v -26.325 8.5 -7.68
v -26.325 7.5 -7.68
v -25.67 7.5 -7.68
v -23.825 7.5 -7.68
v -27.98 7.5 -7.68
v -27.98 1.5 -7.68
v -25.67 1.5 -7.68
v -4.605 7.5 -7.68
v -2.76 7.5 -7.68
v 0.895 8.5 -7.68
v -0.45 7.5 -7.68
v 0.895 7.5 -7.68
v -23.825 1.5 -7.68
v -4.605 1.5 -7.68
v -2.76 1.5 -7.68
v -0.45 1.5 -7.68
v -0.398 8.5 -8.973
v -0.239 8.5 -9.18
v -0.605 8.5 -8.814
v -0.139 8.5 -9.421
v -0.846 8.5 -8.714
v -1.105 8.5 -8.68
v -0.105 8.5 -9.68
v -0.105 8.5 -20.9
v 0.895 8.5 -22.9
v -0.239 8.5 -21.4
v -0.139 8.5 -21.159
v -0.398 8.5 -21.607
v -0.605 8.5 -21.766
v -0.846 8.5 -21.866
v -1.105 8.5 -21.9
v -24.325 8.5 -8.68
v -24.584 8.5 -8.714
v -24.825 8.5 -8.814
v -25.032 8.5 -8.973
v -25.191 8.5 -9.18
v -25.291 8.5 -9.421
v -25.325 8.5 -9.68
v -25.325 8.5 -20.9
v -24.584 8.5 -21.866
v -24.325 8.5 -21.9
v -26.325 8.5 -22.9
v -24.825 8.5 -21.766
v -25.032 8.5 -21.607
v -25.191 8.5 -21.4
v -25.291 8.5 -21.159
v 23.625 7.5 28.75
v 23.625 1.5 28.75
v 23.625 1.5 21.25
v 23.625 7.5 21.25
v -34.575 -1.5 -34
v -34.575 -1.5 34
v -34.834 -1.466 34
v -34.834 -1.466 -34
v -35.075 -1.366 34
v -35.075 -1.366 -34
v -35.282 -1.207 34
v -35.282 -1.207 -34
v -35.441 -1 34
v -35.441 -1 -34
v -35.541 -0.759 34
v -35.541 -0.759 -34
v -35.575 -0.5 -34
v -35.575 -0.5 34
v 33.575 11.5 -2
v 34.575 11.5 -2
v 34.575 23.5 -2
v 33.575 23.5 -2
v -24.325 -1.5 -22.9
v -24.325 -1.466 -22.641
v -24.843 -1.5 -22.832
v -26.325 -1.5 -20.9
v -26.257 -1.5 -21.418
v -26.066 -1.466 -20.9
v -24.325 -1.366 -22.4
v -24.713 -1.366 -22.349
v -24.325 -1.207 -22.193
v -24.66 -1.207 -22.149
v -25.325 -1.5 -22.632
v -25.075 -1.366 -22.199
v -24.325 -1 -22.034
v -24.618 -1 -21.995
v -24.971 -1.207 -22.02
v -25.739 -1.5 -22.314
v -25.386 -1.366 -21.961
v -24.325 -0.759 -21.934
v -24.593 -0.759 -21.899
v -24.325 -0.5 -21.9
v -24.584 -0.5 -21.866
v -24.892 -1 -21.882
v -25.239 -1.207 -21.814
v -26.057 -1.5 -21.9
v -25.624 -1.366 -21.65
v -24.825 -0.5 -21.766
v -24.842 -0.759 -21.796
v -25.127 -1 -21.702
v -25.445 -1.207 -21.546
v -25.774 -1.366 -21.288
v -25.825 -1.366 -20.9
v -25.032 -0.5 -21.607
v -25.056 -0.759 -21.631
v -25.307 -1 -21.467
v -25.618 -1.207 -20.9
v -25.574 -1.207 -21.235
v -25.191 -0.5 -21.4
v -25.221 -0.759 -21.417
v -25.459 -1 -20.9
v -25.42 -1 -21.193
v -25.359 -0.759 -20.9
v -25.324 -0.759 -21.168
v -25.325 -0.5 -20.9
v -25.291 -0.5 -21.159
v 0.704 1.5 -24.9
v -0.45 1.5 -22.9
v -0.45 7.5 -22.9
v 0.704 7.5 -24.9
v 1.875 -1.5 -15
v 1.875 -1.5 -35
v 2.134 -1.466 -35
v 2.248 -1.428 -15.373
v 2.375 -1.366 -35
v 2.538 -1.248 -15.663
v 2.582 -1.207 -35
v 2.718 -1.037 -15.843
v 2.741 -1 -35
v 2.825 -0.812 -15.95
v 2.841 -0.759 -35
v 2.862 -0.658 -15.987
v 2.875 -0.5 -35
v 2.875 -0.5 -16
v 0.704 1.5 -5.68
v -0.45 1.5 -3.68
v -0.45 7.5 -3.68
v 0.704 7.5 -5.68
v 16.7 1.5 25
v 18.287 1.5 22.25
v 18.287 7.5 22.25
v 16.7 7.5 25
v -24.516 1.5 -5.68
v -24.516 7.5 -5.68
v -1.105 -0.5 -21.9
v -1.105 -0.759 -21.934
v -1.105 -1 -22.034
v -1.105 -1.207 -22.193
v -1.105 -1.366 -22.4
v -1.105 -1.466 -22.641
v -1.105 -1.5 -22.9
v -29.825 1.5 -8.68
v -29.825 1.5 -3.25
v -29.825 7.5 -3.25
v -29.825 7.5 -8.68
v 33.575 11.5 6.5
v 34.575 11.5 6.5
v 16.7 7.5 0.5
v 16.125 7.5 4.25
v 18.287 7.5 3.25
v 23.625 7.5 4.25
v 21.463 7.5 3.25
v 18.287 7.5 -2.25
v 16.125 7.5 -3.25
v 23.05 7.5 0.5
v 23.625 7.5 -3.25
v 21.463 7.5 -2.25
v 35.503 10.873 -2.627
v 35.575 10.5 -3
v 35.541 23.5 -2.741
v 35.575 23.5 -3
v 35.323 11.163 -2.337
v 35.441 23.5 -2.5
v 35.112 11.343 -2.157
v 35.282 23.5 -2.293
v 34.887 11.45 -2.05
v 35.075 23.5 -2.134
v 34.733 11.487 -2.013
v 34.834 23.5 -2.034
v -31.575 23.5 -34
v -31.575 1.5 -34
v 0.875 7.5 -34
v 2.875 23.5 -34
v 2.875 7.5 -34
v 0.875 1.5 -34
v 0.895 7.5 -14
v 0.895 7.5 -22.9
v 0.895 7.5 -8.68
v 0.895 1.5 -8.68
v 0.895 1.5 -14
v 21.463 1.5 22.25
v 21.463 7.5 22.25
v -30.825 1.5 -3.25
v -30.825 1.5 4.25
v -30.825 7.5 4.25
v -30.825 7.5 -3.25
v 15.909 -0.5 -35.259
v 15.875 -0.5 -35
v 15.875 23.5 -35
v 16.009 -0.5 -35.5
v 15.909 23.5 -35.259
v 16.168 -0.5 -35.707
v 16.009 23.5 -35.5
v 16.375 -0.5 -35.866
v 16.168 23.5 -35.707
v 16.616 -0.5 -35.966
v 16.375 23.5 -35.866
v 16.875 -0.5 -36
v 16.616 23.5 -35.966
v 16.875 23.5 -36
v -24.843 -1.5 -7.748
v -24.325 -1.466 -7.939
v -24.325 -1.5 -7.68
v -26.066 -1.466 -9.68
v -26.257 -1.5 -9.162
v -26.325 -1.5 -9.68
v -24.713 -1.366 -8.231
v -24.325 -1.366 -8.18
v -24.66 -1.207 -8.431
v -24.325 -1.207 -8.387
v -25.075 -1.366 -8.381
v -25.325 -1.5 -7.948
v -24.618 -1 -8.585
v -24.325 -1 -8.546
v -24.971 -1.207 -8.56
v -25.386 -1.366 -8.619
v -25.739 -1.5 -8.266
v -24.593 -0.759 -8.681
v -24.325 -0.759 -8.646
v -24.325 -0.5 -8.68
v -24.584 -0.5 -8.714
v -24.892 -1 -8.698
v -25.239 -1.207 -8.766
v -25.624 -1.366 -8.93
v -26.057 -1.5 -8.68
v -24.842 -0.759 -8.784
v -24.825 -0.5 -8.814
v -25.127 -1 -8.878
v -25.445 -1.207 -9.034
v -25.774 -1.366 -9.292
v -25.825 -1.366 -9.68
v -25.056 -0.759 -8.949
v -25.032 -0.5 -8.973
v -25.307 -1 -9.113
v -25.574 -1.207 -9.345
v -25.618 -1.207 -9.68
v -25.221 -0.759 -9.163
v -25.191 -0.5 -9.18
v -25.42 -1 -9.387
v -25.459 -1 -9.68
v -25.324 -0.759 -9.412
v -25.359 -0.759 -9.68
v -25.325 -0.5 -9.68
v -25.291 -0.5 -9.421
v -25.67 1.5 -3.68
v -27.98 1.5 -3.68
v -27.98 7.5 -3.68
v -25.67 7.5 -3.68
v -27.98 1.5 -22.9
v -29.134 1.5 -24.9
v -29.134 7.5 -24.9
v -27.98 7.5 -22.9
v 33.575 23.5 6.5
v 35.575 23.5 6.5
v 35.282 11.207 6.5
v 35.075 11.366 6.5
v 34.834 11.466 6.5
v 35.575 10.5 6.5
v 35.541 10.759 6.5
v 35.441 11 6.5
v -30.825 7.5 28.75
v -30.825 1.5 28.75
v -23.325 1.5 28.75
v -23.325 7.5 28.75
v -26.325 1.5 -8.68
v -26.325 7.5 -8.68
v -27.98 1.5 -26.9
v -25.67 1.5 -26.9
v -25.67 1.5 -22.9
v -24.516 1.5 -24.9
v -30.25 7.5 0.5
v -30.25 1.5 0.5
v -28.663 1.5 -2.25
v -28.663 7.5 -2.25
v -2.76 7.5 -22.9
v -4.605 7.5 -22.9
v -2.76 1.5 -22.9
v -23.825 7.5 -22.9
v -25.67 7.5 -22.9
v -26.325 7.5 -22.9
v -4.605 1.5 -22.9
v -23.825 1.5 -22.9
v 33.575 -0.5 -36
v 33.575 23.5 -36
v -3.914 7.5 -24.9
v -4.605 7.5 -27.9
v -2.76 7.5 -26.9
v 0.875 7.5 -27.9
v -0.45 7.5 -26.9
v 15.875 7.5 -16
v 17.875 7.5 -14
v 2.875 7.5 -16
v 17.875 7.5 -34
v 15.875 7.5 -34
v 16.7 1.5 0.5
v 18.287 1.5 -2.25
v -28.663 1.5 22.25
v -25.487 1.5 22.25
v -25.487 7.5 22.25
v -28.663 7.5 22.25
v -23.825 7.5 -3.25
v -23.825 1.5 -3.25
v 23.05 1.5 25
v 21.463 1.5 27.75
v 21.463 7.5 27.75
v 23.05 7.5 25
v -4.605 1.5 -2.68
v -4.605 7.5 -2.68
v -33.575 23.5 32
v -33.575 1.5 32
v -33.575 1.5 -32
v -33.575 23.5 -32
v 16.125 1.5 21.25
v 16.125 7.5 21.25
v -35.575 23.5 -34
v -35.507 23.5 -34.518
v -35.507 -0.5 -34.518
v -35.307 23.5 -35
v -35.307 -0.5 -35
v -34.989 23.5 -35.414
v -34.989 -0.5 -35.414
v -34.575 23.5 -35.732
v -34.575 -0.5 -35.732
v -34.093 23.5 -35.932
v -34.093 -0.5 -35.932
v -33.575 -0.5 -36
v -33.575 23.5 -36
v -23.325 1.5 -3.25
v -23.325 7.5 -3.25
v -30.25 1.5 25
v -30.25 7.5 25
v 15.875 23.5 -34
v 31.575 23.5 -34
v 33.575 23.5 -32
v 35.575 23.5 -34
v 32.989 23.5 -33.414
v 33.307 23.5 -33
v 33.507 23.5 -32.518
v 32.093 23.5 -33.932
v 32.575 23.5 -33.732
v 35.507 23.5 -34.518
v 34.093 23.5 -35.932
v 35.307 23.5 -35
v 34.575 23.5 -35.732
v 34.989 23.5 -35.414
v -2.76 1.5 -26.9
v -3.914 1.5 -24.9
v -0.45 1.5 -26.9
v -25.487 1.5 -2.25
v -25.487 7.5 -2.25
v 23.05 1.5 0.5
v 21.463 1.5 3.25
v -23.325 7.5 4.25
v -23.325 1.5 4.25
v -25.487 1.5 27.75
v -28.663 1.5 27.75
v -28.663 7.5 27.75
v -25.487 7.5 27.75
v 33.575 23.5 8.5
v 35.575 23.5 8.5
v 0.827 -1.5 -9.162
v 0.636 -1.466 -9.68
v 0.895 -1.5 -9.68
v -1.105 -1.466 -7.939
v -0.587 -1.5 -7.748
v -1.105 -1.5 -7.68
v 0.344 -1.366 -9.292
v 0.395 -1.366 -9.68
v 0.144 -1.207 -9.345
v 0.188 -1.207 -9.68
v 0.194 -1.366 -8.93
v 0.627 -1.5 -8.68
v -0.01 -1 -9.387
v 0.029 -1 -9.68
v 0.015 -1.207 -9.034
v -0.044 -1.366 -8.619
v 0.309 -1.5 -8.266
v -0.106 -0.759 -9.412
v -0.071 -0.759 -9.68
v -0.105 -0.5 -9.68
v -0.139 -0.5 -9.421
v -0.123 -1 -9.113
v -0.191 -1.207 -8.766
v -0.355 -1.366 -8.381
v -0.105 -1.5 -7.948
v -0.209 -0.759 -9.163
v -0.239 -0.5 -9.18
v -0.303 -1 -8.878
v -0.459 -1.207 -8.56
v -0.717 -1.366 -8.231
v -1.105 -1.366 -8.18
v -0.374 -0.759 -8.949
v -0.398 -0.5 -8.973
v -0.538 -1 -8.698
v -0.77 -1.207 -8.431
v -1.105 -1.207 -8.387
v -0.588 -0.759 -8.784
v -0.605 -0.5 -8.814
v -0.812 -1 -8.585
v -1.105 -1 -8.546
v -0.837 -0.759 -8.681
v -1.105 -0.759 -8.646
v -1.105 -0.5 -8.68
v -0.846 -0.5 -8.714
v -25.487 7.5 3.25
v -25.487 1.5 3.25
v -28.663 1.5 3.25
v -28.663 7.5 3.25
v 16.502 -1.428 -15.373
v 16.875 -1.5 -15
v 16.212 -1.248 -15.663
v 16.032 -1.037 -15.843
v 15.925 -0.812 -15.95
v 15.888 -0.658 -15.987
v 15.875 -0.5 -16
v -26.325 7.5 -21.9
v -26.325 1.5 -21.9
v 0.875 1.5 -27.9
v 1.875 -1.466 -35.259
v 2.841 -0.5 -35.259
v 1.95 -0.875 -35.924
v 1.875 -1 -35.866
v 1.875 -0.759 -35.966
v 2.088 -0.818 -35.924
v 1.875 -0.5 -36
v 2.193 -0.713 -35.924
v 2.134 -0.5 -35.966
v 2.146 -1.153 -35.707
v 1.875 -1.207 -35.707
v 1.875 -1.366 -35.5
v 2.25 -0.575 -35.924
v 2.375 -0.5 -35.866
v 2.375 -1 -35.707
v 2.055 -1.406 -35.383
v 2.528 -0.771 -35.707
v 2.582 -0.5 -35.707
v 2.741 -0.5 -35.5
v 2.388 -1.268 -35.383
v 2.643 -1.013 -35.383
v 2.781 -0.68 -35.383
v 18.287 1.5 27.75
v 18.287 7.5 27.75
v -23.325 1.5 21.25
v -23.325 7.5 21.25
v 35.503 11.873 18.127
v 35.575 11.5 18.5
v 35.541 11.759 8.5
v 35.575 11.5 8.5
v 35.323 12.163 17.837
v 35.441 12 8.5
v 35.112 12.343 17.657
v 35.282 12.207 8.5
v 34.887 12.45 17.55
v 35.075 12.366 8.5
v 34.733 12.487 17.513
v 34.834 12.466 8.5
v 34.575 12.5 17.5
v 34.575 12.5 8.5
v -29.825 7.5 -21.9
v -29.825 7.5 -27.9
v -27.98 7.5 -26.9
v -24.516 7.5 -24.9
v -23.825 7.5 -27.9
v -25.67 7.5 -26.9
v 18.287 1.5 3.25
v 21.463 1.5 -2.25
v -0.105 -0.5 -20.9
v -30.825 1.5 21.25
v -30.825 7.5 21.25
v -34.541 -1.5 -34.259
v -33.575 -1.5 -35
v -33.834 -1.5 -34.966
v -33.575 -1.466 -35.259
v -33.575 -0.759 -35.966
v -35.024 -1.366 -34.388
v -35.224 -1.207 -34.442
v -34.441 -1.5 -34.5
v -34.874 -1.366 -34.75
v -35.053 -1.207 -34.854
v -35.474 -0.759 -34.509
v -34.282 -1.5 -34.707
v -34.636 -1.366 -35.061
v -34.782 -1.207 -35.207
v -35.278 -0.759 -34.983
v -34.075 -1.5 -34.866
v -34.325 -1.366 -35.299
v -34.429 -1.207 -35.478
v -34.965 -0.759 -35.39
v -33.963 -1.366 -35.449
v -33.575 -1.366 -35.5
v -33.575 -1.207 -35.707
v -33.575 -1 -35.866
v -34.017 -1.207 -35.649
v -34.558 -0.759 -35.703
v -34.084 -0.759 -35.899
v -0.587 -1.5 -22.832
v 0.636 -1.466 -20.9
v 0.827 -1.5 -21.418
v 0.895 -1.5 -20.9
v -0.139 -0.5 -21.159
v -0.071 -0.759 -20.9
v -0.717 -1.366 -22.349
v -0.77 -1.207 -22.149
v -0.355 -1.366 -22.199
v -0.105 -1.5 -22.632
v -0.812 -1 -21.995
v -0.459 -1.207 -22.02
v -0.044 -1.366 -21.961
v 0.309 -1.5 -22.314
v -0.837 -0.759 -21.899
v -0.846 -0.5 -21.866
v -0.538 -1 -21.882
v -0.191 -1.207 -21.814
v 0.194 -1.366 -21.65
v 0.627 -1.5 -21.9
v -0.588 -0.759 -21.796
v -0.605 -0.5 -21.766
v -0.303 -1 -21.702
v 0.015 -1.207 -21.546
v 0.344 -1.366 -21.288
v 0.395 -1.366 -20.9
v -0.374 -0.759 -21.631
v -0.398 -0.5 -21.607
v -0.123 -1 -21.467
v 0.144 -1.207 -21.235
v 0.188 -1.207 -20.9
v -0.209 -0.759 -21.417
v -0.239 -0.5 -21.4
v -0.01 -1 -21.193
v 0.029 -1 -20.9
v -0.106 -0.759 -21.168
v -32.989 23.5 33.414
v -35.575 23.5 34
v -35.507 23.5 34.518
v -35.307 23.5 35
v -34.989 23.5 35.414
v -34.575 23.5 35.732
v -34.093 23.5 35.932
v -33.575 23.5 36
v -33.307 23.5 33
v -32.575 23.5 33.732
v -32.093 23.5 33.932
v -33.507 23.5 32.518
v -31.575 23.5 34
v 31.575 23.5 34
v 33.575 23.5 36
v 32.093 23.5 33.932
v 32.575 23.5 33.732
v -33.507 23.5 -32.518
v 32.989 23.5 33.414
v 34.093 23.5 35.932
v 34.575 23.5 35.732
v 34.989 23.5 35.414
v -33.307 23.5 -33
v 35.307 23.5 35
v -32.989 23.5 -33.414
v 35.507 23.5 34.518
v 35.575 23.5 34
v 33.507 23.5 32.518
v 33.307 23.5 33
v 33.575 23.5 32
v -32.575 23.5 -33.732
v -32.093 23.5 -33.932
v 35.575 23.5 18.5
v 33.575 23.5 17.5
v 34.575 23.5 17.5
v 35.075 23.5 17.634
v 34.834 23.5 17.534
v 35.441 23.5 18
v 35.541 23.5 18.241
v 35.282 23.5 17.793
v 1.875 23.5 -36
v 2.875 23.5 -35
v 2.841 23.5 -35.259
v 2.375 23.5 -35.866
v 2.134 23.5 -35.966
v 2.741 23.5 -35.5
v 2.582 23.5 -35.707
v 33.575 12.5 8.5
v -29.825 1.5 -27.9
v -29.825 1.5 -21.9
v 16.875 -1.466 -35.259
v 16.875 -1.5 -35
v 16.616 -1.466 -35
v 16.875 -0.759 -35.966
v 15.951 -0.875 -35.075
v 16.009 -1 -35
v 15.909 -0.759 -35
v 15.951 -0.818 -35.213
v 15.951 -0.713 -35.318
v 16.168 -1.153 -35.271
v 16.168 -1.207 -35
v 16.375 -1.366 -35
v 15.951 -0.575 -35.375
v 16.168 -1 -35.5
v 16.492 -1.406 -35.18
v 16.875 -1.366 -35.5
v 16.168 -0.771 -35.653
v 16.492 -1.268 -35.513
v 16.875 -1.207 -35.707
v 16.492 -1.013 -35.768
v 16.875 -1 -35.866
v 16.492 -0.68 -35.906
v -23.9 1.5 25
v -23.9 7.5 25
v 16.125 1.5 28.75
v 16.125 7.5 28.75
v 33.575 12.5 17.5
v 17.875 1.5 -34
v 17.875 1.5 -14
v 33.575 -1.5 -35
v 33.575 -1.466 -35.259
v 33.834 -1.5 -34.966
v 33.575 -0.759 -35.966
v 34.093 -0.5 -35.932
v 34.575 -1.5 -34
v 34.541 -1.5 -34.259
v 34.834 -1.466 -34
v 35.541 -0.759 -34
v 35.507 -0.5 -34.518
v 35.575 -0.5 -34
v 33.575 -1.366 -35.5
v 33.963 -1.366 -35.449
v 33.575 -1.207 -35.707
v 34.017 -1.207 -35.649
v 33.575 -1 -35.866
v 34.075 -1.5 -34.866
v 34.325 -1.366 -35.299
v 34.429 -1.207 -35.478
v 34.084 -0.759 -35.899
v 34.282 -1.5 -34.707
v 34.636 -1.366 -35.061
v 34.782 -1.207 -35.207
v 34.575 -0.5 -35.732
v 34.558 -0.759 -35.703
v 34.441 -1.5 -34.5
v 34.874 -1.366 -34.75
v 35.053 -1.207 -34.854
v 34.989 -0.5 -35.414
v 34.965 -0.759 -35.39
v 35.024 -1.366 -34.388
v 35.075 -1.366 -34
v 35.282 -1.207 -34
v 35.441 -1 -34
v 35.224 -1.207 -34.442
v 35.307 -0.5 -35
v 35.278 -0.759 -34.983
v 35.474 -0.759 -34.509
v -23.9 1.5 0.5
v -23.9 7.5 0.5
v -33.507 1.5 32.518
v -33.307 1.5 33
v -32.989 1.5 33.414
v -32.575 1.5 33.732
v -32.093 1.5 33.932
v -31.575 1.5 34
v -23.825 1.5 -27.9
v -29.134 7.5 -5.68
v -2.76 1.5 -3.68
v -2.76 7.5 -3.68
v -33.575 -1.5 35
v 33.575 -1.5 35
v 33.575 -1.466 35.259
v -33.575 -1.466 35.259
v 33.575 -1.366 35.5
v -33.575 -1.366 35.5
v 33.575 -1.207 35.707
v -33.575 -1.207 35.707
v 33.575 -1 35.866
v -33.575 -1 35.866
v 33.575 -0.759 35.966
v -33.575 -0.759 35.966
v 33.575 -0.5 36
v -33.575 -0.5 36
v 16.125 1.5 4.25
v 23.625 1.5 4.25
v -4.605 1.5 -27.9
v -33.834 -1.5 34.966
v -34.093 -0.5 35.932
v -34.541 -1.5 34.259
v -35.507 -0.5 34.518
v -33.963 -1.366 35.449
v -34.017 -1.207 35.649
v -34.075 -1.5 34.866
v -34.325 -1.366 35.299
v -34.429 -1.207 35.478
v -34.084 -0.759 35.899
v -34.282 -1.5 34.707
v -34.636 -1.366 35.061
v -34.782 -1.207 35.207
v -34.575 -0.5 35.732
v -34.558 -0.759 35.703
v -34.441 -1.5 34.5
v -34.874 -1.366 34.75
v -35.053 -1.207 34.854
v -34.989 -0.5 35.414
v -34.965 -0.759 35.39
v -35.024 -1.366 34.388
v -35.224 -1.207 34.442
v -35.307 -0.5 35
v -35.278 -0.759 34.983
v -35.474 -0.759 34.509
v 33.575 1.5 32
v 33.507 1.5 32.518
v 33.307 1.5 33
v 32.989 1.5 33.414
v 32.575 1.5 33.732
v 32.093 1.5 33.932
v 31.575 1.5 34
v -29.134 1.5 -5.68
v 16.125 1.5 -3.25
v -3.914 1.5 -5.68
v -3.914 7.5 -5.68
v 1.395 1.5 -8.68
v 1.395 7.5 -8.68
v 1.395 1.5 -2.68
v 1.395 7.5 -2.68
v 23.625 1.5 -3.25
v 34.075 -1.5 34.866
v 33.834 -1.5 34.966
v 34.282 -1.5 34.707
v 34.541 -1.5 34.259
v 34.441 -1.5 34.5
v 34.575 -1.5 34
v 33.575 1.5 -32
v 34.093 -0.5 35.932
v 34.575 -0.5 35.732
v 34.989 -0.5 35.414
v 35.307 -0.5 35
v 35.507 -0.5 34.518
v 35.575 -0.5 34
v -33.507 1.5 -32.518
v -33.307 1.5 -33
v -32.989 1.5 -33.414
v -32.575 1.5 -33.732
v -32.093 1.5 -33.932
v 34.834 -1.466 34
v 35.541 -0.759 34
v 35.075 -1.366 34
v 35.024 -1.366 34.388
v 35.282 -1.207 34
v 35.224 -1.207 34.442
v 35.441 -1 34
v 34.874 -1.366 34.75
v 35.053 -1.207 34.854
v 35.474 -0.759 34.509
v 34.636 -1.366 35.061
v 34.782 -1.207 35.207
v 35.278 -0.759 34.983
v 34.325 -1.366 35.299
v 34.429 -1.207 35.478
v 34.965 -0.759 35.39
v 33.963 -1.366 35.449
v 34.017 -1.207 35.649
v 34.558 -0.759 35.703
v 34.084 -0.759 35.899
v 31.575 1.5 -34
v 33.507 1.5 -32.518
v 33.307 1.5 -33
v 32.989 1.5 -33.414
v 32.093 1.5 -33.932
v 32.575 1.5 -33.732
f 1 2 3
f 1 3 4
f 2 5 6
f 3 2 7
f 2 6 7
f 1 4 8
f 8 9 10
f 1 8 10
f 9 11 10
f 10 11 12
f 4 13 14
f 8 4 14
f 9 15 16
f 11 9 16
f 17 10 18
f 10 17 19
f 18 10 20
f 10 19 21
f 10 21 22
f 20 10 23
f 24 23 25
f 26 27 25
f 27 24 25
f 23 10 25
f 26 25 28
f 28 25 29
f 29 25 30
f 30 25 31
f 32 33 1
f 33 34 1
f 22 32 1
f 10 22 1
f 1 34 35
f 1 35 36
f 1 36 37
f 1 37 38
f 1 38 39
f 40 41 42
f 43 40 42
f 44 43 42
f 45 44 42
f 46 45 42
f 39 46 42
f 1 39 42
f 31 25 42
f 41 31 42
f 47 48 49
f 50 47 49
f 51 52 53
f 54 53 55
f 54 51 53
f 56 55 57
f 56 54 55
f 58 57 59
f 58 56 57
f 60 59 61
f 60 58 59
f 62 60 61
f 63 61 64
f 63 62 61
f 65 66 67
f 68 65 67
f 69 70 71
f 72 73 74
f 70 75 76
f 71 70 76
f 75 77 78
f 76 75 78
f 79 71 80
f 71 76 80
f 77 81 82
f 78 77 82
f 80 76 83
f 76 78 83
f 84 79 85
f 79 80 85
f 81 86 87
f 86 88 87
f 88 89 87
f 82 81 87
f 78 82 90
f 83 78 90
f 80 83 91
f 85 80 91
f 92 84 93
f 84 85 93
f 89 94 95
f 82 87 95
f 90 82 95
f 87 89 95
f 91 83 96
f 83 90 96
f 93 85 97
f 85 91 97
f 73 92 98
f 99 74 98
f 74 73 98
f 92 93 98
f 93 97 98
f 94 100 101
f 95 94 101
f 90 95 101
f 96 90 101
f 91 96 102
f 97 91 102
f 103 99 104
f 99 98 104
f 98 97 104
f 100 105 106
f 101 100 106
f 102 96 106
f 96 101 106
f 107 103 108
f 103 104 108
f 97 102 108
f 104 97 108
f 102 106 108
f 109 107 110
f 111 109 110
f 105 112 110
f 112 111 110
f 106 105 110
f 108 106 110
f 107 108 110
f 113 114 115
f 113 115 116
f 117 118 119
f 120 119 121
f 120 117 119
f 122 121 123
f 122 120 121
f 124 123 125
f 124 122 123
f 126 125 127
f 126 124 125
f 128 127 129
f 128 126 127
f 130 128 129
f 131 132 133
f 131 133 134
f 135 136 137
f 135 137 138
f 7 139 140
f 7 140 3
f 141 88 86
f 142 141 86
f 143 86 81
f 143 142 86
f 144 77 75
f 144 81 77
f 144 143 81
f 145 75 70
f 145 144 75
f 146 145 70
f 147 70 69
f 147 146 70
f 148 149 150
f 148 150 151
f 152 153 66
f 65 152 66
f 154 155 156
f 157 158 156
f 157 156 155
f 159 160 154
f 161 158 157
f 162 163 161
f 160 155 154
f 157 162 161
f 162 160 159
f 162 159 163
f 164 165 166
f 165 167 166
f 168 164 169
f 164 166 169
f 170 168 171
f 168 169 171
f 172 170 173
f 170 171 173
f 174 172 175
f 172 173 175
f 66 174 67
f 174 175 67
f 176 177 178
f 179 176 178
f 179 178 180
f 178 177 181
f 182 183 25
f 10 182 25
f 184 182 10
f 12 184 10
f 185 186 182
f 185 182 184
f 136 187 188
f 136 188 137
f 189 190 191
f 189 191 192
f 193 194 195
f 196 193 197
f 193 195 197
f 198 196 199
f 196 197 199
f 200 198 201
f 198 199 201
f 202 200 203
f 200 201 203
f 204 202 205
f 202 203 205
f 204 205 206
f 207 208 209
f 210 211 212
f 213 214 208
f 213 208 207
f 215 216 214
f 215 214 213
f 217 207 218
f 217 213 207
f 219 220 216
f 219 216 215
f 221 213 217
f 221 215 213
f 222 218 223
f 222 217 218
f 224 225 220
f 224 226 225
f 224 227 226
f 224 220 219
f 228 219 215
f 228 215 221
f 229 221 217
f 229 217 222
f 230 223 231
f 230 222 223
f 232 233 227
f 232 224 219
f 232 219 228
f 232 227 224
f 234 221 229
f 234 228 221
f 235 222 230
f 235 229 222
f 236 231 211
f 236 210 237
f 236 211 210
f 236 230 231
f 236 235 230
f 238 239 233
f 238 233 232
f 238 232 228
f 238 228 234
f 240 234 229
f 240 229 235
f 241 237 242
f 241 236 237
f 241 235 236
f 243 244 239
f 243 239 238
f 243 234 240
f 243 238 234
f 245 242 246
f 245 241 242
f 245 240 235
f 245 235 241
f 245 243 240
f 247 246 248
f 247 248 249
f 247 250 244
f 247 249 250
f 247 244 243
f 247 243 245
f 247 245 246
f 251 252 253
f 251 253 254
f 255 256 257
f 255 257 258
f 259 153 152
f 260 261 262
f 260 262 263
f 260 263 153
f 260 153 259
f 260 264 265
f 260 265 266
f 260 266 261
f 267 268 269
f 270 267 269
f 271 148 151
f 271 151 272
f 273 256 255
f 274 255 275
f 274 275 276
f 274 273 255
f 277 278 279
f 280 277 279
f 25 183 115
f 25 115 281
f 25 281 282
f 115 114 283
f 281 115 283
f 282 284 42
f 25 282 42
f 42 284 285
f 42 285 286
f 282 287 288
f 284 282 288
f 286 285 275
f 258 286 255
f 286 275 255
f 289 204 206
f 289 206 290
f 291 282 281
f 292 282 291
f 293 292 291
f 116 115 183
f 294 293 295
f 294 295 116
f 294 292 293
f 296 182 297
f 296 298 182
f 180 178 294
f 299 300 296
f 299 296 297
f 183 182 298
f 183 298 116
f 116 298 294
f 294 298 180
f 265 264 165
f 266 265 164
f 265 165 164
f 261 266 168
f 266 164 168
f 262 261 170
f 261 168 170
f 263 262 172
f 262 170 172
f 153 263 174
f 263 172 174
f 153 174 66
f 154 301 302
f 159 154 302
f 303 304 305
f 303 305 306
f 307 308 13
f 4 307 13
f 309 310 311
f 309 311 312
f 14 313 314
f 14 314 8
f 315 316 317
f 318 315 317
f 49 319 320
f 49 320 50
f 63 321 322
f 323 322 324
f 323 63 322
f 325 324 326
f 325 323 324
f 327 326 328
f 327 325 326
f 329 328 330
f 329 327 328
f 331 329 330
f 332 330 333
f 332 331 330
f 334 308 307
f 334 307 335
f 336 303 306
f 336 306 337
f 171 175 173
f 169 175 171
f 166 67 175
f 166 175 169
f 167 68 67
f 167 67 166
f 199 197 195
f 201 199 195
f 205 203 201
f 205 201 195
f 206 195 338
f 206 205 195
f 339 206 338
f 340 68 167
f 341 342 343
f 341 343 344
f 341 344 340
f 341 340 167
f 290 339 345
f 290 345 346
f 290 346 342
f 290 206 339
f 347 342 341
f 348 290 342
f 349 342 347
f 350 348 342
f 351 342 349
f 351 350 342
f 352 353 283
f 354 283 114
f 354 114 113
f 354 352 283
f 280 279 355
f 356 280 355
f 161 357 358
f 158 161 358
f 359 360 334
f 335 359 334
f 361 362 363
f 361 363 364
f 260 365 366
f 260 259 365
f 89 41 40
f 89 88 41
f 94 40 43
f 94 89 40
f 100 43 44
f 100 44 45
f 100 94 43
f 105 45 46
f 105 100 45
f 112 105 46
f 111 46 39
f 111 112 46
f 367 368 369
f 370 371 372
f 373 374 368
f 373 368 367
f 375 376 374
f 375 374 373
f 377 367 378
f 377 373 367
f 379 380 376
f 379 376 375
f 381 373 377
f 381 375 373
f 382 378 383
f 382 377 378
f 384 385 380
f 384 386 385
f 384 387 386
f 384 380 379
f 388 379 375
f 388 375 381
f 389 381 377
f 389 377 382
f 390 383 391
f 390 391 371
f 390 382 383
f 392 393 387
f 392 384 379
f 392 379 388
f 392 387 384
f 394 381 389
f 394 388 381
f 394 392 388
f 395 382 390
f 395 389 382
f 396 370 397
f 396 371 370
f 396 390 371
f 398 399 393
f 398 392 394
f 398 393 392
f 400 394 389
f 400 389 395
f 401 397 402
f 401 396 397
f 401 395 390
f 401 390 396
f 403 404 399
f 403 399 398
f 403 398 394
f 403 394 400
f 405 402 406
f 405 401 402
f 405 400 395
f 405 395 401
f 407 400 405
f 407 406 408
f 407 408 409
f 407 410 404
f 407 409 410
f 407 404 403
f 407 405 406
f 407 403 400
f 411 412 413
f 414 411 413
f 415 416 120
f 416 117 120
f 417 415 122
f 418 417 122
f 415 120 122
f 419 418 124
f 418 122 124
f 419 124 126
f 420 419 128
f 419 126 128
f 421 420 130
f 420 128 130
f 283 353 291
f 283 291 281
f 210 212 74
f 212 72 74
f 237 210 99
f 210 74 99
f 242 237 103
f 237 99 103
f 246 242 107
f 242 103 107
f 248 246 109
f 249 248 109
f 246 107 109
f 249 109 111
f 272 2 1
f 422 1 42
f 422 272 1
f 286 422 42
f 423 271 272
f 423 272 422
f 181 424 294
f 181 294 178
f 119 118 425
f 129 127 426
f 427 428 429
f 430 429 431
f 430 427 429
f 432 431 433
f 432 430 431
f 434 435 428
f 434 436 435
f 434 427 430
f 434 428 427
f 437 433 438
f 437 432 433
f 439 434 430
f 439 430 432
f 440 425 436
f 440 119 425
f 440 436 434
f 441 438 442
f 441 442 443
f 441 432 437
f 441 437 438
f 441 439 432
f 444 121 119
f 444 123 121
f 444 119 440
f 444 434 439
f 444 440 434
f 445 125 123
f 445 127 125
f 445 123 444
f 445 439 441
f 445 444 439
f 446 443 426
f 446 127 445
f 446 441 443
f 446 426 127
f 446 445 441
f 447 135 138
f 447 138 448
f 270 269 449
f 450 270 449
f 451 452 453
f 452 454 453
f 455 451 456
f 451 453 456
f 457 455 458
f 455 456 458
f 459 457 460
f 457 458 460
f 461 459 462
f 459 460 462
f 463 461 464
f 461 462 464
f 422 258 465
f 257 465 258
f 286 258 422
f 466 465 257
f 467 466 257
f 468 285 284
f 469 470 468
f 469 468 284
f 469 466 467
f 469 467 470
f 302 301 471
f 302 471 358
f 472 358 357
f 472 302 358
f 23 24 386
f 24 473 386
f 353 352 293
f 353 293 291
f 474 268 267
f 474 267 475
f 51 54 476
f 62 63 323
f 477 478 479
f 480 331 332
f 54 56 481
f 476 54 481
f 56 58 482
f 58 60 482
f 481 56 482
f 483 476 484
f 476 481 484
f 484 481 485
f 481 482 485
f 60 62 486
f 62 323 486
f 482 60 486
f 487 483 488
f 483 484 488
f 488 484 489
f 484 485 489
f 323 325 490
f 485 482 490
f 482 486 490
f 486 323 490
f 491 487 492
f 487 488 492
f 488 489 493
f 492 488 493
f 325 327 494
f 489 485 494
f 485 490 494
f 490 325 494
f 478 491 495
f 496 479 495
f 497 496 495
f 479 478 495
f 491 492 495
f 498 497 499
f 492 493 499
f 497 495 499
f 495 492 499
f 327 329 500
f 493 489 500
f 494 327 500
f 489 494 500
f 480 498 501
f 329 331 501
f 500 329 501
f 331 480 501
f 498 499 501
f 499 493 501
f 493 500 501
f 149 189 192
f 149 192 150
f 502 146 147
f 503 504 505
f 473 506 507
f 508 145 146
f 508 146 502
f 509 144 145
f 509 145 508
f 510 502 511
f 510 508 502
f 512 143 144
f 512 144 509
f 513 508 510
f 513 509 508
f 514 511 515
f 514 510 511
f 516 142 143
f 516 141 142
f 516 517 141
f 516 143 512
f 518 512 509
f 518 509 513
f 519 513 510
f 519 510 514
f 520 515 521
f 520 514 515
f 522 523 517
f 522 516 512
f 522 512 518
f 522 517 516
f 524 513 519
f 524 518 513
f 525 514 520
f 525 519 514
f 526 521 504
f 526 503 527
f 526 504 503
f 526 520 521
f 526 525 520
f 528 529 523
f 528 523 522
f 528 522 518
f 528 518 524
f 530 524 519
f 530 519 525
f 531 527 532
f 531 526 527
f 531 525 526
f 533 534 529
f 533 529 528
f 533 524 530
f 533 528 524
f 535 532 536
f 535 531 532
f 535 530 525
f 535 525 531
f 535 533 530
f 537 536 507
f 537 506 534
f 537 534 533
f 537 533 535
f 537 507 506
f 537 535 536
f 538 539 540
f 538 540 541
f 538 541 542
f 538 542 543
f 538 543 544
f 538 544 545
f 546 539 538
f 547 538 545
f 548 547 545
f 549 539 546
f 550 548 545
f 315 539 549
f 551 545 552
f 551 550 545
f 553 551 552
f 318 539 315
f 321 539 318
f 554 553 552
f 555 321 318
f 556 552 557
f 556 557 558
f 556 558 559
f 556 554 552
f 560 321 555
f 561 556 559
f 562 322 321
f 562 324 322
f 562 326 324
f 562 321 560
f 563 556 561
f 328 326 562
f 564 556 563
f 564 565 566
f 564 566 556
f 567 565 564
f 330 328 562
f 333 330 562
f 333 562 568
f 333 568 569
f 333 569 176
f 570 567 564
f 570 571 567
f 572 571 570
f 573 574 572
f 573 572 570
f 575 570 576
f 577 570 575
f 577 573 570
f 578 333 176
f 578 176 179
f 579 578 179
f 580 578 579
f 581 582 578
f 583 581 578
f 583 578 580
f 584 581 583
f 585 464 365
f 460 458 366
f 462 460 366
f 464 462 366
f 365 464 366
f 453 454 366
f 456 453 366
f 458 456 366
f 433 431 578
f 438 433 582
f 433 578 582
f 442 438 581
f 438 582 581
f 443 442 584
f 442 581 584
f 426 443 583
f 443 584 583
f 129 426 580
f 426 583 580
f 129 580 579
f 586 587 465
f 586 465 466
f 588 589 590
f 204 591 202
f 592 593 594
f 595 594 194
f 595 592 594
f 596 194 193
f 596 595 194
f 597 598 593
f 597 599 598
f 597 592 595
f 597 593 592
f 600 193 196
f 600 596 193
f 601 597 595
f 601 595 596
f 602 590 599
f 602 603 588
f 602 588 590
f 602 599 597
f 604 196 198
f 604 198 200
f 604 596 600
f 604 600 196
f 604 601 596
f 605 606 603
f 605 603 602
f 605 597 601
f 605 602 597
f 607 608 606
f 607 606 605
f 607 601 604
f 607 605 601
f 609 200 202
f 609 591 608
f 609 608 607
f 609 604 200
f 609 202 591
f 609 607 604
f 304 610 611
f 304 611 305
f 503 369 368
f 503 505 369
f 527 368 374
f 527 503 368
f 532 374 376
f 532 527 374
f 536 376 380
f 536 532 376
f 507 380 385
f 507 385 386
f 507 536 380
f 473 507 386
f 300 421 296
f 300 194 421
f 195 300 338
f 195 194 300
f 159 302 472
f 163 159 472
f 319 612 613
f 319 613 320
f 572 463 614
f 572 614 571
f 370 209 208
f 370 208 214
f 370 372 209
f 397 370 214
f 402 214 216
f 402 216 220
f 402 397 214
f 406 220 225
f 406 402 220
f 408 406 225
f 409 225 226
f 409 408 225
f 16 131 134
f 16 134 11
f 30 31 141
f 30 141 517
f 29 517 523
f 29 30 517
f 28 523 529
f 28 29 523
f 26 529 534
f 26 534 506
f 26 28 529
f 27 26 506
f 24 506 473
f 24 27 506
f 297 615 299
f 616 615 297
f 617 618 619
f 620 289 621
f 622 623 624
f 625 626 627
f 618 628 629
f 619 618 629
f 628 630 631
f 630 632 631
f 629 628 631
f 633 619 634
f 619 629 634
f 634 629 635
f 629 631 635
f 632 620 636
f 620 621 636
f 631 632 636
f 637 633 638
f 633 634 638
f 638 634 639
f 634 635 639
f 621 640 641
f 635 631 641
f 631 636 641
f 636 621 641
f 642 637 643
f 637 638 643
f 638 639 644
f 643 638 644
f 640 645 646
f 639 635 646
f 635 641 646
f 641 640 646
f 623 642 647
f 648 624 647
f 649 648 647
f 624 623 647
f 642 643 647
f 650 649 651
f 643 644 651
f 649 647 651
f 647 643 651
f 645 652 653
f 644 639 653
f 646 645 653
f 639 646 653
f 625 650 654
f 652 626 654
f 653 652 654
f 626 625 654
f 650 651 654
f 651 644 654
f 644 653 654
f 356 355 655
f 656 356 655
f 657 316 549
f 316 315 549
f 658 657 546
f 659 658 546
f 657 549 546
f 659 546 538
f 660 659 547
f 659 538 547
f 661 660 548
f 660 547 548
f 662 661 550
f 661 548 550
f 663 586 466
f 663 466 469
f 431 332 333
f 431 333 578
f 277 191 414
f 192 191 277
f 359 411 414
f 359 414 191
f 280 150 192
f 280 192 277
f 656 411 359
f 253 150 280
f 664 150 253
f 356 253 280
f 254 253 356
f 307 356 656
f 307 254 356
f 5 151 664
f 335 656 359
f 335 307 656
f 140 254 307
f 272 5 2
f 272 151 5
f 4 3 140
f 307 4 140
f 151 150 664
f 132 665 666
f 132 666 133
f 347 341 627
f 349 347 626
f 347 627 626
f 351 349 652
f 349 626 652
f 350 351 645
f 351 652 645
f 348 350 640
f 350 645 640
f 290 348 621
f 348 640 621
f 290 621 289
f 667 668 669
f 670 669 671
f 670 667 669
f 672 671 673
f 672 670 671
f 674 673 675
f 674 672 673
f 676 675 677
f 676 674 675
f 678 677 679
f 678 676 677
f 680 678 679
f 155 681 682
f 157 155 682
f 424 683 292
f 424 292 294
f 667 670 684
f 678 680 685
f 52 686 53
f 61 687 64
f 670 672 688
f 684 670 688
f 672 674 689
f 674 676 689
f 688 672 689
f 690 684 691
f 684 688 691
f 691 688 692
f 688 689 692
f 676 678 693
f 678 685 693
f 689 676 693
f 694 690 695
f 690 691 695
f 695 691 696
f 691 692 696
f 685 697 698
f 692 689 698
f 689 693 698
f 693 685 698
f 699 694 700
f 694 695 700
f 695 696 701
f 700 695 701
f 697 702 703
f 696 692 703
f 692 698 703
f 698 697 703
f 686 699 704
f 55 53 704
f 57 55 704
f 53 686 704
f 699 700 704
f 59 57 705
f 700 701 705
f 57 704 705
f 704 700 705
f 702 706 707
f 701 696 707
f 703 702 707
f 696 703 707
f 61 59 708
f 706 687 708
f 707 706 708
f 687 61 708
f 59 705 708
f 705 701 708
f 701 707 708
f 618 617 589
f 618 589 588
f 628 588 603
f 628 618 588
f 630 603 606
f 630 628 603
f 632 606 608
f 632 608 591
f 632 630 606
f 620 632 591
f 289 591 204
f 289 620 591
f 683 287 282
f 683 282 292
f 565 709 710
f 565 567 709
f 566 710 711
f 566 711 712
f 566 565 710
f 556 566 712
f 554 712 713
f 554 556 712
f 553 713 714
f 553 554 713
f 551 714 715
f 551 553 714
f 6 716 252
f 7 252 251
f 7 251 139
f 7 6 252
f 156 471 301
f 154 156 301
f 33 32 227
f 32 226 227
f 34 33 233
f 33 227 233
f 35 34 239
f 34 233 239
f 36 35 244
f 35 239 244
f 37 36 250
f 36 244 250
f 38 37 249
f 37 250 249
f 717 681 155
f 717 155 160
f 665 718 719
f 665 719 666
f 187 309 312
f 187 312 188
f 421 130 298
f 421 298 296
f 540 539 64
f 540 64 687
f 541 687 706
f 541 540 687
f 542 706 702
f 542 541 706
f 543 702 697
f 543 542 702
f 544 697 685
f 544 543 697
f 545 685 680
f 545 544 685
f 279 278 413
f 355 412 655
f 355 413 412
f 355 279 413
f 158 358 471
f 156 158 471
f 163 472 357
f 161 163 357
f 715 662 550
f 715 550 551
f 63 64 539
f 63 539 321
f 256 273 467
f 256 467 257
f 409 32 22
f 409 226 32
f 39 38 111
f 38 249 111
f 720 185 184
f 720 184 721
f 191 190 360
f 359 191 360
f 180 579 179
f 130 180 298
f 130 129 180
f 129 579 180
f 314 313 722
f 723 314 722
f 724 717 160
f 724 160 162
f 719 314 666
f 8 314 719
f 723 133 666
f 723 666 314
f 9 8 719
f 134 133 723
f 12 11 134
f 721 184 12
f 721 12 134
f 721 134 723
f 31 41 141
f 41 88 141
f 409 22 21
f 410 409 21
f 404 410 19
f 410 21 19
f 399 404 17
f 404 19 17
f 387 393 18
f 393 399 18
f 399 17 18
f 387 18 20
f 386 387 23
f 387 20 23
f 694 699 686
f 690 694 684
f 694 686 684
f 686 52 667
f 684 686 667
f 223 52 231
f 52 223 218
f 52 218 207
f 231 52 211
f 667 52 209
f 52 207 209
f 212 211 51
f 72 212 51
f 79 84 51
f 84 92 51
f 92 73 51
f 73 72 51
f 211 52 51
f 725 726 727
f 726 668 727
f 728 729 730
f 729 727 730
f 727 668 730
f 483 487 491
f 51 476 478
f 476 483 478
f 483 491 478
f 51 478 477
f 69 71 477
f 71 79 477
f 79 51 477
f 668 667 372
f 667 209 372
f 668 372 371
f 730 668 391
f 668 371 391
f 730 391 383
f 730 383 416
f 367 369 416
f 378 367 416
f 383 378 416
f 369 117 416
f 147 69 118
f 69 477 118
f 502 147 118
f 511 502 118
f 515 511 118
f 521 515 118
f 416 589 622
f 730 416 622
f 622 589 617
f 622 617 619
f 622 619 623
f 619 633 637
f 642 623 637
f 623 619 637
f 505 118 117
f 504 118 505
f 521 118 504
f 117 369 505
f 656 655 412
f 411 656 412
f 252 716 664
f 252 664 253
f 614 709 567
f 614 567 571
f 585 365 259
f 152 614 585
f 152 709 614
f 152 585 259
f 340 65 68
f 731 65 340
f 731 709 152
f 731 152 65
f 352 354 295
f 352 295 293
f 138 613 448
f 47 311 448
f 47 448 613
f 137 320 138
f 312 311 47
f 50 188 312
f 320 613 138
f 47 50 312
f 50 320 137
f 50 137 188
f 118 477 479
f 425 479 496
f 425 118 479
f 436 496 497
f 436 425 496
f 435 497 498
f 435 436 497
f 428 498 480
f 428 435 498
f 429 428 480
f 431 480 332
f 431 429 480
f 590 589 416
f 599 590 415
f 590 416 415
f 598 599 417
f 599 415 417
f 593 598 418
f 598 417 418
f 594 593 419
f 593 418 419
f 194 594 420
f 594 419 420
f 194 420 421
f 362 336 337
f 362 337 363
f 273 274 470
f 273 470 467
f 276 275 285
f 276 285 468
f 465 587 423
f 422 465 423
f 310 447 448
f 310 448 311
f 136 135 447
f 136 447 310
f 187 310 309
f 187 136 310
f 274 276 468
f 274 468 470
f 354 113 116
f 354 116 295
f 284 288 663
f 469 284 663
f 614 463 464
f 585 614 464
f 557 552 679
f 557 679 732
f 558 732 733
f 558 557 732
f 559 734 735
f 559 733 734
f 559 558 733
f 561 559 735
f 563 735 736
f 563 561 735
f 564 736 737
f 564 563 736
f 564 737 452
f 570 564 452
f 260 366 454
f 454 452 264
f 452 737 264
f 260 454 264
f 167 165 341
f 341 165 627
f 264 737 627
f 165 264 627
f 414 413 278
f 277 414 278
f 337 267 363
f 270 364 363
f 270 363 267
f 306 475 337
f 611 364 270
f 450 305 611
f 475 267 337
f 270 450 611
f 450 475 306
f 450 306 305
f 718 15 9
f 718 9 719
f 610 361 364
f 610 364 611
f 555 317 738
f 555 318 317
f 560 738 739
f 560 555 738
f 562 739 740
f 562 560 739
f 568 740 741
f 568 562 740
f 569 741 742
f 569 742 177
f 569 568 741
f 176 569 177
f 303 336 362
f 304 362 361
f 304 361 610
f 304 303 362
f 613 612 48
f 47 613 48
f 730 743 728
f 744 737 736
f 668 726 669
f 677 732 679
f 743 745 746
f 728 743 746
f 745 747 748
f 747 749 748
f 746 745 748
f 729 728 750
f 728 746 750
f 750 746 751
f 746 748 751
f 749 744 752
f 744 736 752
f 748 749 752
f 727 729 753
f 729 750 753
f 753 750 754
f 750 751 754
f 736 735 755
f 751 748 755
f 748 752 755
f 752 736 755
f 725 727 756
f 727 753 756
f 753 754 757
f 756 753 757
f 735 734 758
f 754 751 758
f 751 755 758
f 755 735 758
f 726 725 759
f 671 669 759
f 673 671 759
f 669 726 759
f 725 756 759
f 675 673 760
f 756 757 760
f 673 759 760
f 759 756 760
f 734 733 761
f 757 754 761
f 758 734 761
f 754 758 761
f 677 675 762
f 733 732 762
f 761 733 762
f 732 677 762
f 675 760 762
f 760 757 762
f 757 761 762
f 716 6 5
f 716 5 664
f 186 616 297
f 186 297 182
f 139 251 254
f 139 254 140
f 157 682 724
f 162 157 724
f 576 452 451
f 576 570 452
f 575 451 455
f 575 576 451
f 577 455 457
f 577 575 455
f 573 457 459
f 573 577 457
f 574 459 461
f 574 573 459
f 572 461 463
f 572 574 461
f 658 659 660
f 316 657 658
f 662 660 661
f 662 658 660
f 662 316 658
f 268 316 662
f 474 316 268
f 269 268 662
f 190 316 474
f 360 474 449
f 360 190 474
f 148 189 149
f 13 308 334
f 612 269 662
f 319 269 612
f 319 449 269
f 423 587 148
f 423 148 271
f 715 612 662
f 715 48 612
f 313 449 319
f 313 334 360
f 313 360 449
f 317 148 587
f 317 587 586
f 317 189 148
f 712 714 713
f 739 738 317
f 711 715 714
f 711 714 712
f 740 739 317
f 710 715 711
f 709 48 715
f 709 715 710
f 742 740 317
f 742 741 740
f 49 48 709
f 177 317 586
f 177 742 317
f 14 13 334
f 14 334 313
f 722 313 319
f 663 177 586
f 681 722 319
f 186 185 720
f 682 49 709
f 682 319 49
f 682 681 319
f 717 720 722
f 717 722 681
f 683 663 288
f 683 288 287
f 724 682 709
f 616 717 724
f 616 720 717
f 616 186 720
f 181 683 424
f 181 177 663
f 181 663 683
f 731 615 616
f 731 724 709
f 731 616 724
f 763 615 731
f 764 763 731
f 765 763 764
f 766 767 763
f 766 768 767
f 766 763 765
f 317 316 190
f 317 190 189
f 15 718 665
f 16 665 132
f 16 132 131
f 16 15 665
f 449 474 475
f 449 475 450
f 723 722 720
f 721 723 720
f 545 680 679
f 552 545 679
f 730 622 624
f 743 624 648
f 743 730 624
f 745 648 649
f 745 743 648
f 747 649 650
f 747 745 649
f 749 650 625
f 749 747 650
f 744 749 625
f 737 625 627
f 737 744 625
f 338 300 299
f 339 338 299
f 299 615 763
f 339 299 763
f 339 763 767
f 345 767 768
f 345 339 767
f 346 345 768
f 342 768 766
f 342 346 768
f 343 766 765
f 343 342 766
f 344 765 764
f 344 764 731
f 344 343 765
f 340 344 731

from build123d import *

# Parameters (mm, degrees)
ESBO_O1_W                  = 71.15
ESBO_O1_H                  = 72
RESSALTO_EXTRUS_O1_DEPTH   = 1.5
ESBO_O2_W                  = 71.15
ESBO_O2_H                  = 72
ESBO_O2_W_2                = 67.15
ESBO_O2_H_2                = 68
RESSALTO_EXTRUS_O2_DEPTH   = 22
FILETE1_R                  = 2
ESBO_O3_W                  = 13
ESBO_O3_H                  = 25
CORTE_EXTRUS_O1_DEPTH      = 20
RESSALTO_EXTRUS_O3_DEPTH   = 6
ESBO_O5_W                  = 9
ESBO_O5_H                  = 11
CORTE_EXTRUS_O2_DEPTH      = 1
CORTE_EXTRUS_O2_DEPTH_BACK = 2
ESBO_O6_W                  = 8.5
ESBO_O6_H                  = 12
CORTE_EXTRUS_O3_DEPTH      = 2
ESBO_O7_W                  = 7.5
ESBO_O7_H                  = 7.5
RESSALTO_EXTRUS_O4_DEPTH   = 6
ESBO_O8_W                  = 6
ESBO_O8_H                  = 6
RESSALTO_EXTRUS_O5_DEPTH   = 6
RESSALTO_EXTRUS_O6_DEPTH   = 7
ESBO_O10_W                 = 25.22
ESBO_O10_H                 = 13.22
CORTE_EXTRUS_O4_DEPTH      = 3
FILETE3_R                  = 1
FILETE4_R                  = 1


with BuildPart() as part:
    # Esboço1 → Ressalto-extrusão1 (new body, symmetric)
    with BuildSketch(Plane(origin=(0, 0, 0), x_dir=(1, 0, 0), z_dir=(0, 1, 0))):
        Rectangle(ESBO_O1_W, ESBO_O1_H)
    extrude(amount=RESSALTO_EXTRUS_O1_DEPTH, both=True)

    # Esboço2 → Ressalto-extrusão2 (add)
    with BuildSketch(Plane(origin=(0, 1.5, 0), x_dir=(1, 0, 0), z_dir=(0, 1, 0))):
        Rectangle(ESBO_O2_W, ESBO_O2_H)
        Rectangle(ESBO_O2_W_2, ESBO_O2_H_2, mode=Mode.SUBTRACT)
    extrude(amount=RESSALTO_EXTRUS_O2_DEPTH)

    # Filete1
    filete1_edges = [part.edges().sort_by_distance(p)[0] for p in [
        (-33.575, 12.5, -34),
        (-33.575, 12.5, 34),
        (33.575, 12.5, 34),
        (33.575, 12.5, -34),
        (-35.575, 11, -36),
        (35.575, 11, -36),
        (35.575, 11, 36),
        (-35.575, 11, 36),
    ]]
    fillet(filete1_edges, radius=FILETE1_R)

    # Esboço3 → Corte-extrusão1 (cut)
    with BuildSketch(Plane(origin=(0, 0, -36), x_dir=(-1, 0, 0), z_dir=(0, 0, -1))):
        with Locations((-9.375, 11)):
            Rectangle(ESBO_O3_W, ESBO_O3_H)
    extrude(amount=-CORTE_EXTRUS_O1_DEPTH, mode=Mode.SUBTRACT)

    # Esboço4 → Ressalto-extrusão3 (add)
    with BuildSketch(Plane(origin=(0, 1.5, 0), x_dir=(1, 0, 0), z_dir=(0, 1, 0))):
        Polygon((17.875, 34), (17.875, 14), (0.875, 14), (0.875, 34), (2.875, 34), (2.875, 16), (15.875, 16), (15.875, 34), align=None)
    extrude(amount=RESSALTO_EXTRUS_O3_DEPTH)

    # Esboço5 → Corte-extrusão2 (cut, two sides)
    with BuildSketch(Plane(origin=(35.575, 0, 0), x_dir=(0, 0, -1), z_dir=(1, 0, 0))) as corte_extrus_o2_sk:
        with Locations((-13, 18)):
            Rectangle(ESBO_O5_W, ESBO_O5_H)
    extrude(amount=CORTE_EXTRUS_O2_DEPTH, mode=Mode.SUBTRACT)
    extrude(corte_extrus_o2_sk.sketch, amount=-CORTE_EXTRUS_O2_DEPTH_BACK, mode=Mode.SUBTRACT)

    # Esboço6 → Corte-extrusão3 (cut)
    with BuildSketch(Plane(origin=(35.575, 0, 0), x_dir=(0, 0, -1), z_dir=(1, 0, 0))):
        with Locations((-2.25, 17.5)):
            Rectangle(ESBO_O6_W, ESBO_O6_H)
    extrude(amount=-CORTE_EXTRUS_O3_DEPTH, mode=Mode.SUBTRACT)

    # Esboço7 → Ressalto-extrusão4 (add)
    with BuildSketch(Plane(origin=(0, 1.5, 0), x_dir=(1, 0, 0), z_dir=(0, 1, 0))):
        with Locations((-27.075, -25)):
            Rectangle(ESBO_O7_W, ESBO_O7_H)
        Polygon((-28.66271324, -22.25), (-30.250426481, -25), (-28.66271324, -27.75), (-25.48728676, -27.75), (-23.899573519, -25), (-25.48728676, -22.25), align=None, mode=Mode.SUBTRACT)
        with Locations((19.875, -25)):
            Rectangle(ESBO_O7_W, ESBO_O7_H)
        Polygon((18.28728676, -22.25), (16.699573519, -25), (18.28728676, -27.75), (21.46271324, -27.75), (23.050426481, -25), (21.46271324, -22.25), align=None, mode=Mode.SUBTRACT)
        with Locations((19.875, -0.5)):
            Rectangle(ESBO_O7_W, ESBO_O7_H)
        Polygon((21.46271324, -3.25), (18.28728676, -3.25), (16.699573519, -0.5), (18.28728676, 2.25), (21.46271324, 2.25), (23.050426481, -0.5), align=None, mode=Mode.SUBTRACT)
        with Locations((-27.075, -0.5)):
            Rectangle(ESBO_O7_W, ESBO_O7_H)
        Polygon((-25.48728676, -3.25), (-28.66271324, -3.25), (-30.250426481, -0.5), (-28.66271324, 2.25), (-25.48728676, 2.25), (-23.899573519, -0.5), align=None, mode=Mode.SUBTRACT)
    extrude(amount=RESSALTO_EXTRUS_O4_DEPTH)

    # Esboço8 → Ressalto-extrusão5 (add)
    with BuildSketch(Plane(origin=(0, 1.5, 0), x_dir=(1, 0, 0), z_dir=(0, 1, 0))):
        with Locations((-26.825, 24.9)):
            Rectangle(ESBO_O8_W, ESBO_O8_H)
        Polygon((-27.979700538, 26.9), (-29.134401077, 24.9), (-27.979700538, 22.9), (-25.670299462, 22.9), (-24.515598923, 24.9), (-25.670299462, 26.9), align=None, mode=Mode.SUBTRACT)
        with Locations((-1.605, 24.9)):
            Rectangle(ESBO_O8_W, ESBO_O8_H)
        Polygon((-2.759700538, 26.9), (-3.914401077, 24.9), (-2.759700538, 22.9), (-0.450299462, 22.9), (0.704401077, 24.9), (-0.450299462, 26.9), align=None, mode=Mode.SUBTRACT)
        with Locations((-1.605, 5.68)):
            Rectangle(ESBO_O8_W, ESBO_O8_H)
        Polygon((-2.759700538, 7.68), (-3.914401077, 5.68), (-2.759700538, 3.68), (-0.450299462, 3.68), (0.704401077, 5.68), (-0.450299462, 7.68), align=None, mode=Mode.SUBTRACT)
        with Locations((-26.825, 5.68)):
            Rectangle(ESBO_O8_W, ESBO_O8_H)
        Polygon((-27.979700538, 7.68), (-29.134401077, 5.68), (-27.979700538, 3.68), (-25.670299462, 3.68), (-24.515598923, 5.68), (-25.670299462, 7.68), align=None, mode=Mode.SUBTRACT)
    extrude(amount=RESSALTO_EXTRUS_O5_DEPTH)

    # Esboço9 → Ressalto-extrusão6 (add)
    with BuildSketch(Plane(origin=(0, 1.5, 0), x_dir=(1, 0, 0), z_dir=(0, 1, 0))):
        Polygon((-23.825, 22.9), (-4.605, 22.9), (0.895, 22.9), (0.895, 7.68), (-4.605, 7.68), (-23.825, 7.68), (-26.325, 7.68), (-26.325, 22.9), align=None)
        Polygon((-23.825, 21.9), (-4.605, 21.9), (-0.105, 21.9), (-0.105, 8.68), (-4.605, 8.68), (-23.825, 8.68), (-25.325, 8.68), (-25.325, 21.9), align=None, mode=Mode.SUBTRACT)
    extrude(amount=RESSALTO_EXTRUS_O6_DEPTH)

    # Esboço10 → Corte-extrusão4 (cut)
    with BuildSketch(Plane(origin=(0, 1.5, 0), x_dir=(1, 0, 0), z_dir=(0, 1, 0))):
        with Locations((-12.715, 15.29)):
            Rectangle(ESBO_O10_W, ESBO_O10_H)
    extrude(amount=-CORTE_EXTRUS_O4_DEPTH, mode=Mode.SUBTRACT)

    # Filete3
    filete3_edges = [part.edges().sort_by_distance(p)[0] for p in [
        (-25.325, 3.5, -8.68),
        (-25.325, 3.5, -21.9),
        (-0.105, 3.5, -8.68),
        (-0.105, 3.5, -21.9),
        (-12.715, -1.5, -21.9),
        (-0.105, -1.5, -15.29),
        (-12.715, -1.5, -8.68),
        (-25.325, -1.5, -15.29),
    ]]
    fillet(filete3_edges, radius=FILETE3_R)

    # Filete4
    filete4_edges = [part.edges().sort_by_distance(p)[0] for p in [
        (2.875, -1.5, -26),
        (-15.35, -1.5, -36),
        (-34.989213562, -1.5, -35.414213562),
        (-35.575, -1.5, 0),
        (-34.989213562, -1.5, 35.414213562),
        (0, -1.5, 36),
        (34.989213562, -1.5, 35.414213562),
        (35.575, -1.5, 0),
        (34.989213562, -1.5, -35.414213562),
        (24.725, -1.5, -36),
        (15.875, -1.5, -26),
        (9.375, -1.5, -16),
        (35.575, 18, 17.5),
        (35.575, 12.5, 13),
        (35.575, 11.5, 2.25),
        (35.575, 17.5, -2),
        (15.875, 11, -36),
        (2.875, 11, -36),
    ]]
    fillet(filete4_edges, radius=FILETE4_R)


solid = part.part
